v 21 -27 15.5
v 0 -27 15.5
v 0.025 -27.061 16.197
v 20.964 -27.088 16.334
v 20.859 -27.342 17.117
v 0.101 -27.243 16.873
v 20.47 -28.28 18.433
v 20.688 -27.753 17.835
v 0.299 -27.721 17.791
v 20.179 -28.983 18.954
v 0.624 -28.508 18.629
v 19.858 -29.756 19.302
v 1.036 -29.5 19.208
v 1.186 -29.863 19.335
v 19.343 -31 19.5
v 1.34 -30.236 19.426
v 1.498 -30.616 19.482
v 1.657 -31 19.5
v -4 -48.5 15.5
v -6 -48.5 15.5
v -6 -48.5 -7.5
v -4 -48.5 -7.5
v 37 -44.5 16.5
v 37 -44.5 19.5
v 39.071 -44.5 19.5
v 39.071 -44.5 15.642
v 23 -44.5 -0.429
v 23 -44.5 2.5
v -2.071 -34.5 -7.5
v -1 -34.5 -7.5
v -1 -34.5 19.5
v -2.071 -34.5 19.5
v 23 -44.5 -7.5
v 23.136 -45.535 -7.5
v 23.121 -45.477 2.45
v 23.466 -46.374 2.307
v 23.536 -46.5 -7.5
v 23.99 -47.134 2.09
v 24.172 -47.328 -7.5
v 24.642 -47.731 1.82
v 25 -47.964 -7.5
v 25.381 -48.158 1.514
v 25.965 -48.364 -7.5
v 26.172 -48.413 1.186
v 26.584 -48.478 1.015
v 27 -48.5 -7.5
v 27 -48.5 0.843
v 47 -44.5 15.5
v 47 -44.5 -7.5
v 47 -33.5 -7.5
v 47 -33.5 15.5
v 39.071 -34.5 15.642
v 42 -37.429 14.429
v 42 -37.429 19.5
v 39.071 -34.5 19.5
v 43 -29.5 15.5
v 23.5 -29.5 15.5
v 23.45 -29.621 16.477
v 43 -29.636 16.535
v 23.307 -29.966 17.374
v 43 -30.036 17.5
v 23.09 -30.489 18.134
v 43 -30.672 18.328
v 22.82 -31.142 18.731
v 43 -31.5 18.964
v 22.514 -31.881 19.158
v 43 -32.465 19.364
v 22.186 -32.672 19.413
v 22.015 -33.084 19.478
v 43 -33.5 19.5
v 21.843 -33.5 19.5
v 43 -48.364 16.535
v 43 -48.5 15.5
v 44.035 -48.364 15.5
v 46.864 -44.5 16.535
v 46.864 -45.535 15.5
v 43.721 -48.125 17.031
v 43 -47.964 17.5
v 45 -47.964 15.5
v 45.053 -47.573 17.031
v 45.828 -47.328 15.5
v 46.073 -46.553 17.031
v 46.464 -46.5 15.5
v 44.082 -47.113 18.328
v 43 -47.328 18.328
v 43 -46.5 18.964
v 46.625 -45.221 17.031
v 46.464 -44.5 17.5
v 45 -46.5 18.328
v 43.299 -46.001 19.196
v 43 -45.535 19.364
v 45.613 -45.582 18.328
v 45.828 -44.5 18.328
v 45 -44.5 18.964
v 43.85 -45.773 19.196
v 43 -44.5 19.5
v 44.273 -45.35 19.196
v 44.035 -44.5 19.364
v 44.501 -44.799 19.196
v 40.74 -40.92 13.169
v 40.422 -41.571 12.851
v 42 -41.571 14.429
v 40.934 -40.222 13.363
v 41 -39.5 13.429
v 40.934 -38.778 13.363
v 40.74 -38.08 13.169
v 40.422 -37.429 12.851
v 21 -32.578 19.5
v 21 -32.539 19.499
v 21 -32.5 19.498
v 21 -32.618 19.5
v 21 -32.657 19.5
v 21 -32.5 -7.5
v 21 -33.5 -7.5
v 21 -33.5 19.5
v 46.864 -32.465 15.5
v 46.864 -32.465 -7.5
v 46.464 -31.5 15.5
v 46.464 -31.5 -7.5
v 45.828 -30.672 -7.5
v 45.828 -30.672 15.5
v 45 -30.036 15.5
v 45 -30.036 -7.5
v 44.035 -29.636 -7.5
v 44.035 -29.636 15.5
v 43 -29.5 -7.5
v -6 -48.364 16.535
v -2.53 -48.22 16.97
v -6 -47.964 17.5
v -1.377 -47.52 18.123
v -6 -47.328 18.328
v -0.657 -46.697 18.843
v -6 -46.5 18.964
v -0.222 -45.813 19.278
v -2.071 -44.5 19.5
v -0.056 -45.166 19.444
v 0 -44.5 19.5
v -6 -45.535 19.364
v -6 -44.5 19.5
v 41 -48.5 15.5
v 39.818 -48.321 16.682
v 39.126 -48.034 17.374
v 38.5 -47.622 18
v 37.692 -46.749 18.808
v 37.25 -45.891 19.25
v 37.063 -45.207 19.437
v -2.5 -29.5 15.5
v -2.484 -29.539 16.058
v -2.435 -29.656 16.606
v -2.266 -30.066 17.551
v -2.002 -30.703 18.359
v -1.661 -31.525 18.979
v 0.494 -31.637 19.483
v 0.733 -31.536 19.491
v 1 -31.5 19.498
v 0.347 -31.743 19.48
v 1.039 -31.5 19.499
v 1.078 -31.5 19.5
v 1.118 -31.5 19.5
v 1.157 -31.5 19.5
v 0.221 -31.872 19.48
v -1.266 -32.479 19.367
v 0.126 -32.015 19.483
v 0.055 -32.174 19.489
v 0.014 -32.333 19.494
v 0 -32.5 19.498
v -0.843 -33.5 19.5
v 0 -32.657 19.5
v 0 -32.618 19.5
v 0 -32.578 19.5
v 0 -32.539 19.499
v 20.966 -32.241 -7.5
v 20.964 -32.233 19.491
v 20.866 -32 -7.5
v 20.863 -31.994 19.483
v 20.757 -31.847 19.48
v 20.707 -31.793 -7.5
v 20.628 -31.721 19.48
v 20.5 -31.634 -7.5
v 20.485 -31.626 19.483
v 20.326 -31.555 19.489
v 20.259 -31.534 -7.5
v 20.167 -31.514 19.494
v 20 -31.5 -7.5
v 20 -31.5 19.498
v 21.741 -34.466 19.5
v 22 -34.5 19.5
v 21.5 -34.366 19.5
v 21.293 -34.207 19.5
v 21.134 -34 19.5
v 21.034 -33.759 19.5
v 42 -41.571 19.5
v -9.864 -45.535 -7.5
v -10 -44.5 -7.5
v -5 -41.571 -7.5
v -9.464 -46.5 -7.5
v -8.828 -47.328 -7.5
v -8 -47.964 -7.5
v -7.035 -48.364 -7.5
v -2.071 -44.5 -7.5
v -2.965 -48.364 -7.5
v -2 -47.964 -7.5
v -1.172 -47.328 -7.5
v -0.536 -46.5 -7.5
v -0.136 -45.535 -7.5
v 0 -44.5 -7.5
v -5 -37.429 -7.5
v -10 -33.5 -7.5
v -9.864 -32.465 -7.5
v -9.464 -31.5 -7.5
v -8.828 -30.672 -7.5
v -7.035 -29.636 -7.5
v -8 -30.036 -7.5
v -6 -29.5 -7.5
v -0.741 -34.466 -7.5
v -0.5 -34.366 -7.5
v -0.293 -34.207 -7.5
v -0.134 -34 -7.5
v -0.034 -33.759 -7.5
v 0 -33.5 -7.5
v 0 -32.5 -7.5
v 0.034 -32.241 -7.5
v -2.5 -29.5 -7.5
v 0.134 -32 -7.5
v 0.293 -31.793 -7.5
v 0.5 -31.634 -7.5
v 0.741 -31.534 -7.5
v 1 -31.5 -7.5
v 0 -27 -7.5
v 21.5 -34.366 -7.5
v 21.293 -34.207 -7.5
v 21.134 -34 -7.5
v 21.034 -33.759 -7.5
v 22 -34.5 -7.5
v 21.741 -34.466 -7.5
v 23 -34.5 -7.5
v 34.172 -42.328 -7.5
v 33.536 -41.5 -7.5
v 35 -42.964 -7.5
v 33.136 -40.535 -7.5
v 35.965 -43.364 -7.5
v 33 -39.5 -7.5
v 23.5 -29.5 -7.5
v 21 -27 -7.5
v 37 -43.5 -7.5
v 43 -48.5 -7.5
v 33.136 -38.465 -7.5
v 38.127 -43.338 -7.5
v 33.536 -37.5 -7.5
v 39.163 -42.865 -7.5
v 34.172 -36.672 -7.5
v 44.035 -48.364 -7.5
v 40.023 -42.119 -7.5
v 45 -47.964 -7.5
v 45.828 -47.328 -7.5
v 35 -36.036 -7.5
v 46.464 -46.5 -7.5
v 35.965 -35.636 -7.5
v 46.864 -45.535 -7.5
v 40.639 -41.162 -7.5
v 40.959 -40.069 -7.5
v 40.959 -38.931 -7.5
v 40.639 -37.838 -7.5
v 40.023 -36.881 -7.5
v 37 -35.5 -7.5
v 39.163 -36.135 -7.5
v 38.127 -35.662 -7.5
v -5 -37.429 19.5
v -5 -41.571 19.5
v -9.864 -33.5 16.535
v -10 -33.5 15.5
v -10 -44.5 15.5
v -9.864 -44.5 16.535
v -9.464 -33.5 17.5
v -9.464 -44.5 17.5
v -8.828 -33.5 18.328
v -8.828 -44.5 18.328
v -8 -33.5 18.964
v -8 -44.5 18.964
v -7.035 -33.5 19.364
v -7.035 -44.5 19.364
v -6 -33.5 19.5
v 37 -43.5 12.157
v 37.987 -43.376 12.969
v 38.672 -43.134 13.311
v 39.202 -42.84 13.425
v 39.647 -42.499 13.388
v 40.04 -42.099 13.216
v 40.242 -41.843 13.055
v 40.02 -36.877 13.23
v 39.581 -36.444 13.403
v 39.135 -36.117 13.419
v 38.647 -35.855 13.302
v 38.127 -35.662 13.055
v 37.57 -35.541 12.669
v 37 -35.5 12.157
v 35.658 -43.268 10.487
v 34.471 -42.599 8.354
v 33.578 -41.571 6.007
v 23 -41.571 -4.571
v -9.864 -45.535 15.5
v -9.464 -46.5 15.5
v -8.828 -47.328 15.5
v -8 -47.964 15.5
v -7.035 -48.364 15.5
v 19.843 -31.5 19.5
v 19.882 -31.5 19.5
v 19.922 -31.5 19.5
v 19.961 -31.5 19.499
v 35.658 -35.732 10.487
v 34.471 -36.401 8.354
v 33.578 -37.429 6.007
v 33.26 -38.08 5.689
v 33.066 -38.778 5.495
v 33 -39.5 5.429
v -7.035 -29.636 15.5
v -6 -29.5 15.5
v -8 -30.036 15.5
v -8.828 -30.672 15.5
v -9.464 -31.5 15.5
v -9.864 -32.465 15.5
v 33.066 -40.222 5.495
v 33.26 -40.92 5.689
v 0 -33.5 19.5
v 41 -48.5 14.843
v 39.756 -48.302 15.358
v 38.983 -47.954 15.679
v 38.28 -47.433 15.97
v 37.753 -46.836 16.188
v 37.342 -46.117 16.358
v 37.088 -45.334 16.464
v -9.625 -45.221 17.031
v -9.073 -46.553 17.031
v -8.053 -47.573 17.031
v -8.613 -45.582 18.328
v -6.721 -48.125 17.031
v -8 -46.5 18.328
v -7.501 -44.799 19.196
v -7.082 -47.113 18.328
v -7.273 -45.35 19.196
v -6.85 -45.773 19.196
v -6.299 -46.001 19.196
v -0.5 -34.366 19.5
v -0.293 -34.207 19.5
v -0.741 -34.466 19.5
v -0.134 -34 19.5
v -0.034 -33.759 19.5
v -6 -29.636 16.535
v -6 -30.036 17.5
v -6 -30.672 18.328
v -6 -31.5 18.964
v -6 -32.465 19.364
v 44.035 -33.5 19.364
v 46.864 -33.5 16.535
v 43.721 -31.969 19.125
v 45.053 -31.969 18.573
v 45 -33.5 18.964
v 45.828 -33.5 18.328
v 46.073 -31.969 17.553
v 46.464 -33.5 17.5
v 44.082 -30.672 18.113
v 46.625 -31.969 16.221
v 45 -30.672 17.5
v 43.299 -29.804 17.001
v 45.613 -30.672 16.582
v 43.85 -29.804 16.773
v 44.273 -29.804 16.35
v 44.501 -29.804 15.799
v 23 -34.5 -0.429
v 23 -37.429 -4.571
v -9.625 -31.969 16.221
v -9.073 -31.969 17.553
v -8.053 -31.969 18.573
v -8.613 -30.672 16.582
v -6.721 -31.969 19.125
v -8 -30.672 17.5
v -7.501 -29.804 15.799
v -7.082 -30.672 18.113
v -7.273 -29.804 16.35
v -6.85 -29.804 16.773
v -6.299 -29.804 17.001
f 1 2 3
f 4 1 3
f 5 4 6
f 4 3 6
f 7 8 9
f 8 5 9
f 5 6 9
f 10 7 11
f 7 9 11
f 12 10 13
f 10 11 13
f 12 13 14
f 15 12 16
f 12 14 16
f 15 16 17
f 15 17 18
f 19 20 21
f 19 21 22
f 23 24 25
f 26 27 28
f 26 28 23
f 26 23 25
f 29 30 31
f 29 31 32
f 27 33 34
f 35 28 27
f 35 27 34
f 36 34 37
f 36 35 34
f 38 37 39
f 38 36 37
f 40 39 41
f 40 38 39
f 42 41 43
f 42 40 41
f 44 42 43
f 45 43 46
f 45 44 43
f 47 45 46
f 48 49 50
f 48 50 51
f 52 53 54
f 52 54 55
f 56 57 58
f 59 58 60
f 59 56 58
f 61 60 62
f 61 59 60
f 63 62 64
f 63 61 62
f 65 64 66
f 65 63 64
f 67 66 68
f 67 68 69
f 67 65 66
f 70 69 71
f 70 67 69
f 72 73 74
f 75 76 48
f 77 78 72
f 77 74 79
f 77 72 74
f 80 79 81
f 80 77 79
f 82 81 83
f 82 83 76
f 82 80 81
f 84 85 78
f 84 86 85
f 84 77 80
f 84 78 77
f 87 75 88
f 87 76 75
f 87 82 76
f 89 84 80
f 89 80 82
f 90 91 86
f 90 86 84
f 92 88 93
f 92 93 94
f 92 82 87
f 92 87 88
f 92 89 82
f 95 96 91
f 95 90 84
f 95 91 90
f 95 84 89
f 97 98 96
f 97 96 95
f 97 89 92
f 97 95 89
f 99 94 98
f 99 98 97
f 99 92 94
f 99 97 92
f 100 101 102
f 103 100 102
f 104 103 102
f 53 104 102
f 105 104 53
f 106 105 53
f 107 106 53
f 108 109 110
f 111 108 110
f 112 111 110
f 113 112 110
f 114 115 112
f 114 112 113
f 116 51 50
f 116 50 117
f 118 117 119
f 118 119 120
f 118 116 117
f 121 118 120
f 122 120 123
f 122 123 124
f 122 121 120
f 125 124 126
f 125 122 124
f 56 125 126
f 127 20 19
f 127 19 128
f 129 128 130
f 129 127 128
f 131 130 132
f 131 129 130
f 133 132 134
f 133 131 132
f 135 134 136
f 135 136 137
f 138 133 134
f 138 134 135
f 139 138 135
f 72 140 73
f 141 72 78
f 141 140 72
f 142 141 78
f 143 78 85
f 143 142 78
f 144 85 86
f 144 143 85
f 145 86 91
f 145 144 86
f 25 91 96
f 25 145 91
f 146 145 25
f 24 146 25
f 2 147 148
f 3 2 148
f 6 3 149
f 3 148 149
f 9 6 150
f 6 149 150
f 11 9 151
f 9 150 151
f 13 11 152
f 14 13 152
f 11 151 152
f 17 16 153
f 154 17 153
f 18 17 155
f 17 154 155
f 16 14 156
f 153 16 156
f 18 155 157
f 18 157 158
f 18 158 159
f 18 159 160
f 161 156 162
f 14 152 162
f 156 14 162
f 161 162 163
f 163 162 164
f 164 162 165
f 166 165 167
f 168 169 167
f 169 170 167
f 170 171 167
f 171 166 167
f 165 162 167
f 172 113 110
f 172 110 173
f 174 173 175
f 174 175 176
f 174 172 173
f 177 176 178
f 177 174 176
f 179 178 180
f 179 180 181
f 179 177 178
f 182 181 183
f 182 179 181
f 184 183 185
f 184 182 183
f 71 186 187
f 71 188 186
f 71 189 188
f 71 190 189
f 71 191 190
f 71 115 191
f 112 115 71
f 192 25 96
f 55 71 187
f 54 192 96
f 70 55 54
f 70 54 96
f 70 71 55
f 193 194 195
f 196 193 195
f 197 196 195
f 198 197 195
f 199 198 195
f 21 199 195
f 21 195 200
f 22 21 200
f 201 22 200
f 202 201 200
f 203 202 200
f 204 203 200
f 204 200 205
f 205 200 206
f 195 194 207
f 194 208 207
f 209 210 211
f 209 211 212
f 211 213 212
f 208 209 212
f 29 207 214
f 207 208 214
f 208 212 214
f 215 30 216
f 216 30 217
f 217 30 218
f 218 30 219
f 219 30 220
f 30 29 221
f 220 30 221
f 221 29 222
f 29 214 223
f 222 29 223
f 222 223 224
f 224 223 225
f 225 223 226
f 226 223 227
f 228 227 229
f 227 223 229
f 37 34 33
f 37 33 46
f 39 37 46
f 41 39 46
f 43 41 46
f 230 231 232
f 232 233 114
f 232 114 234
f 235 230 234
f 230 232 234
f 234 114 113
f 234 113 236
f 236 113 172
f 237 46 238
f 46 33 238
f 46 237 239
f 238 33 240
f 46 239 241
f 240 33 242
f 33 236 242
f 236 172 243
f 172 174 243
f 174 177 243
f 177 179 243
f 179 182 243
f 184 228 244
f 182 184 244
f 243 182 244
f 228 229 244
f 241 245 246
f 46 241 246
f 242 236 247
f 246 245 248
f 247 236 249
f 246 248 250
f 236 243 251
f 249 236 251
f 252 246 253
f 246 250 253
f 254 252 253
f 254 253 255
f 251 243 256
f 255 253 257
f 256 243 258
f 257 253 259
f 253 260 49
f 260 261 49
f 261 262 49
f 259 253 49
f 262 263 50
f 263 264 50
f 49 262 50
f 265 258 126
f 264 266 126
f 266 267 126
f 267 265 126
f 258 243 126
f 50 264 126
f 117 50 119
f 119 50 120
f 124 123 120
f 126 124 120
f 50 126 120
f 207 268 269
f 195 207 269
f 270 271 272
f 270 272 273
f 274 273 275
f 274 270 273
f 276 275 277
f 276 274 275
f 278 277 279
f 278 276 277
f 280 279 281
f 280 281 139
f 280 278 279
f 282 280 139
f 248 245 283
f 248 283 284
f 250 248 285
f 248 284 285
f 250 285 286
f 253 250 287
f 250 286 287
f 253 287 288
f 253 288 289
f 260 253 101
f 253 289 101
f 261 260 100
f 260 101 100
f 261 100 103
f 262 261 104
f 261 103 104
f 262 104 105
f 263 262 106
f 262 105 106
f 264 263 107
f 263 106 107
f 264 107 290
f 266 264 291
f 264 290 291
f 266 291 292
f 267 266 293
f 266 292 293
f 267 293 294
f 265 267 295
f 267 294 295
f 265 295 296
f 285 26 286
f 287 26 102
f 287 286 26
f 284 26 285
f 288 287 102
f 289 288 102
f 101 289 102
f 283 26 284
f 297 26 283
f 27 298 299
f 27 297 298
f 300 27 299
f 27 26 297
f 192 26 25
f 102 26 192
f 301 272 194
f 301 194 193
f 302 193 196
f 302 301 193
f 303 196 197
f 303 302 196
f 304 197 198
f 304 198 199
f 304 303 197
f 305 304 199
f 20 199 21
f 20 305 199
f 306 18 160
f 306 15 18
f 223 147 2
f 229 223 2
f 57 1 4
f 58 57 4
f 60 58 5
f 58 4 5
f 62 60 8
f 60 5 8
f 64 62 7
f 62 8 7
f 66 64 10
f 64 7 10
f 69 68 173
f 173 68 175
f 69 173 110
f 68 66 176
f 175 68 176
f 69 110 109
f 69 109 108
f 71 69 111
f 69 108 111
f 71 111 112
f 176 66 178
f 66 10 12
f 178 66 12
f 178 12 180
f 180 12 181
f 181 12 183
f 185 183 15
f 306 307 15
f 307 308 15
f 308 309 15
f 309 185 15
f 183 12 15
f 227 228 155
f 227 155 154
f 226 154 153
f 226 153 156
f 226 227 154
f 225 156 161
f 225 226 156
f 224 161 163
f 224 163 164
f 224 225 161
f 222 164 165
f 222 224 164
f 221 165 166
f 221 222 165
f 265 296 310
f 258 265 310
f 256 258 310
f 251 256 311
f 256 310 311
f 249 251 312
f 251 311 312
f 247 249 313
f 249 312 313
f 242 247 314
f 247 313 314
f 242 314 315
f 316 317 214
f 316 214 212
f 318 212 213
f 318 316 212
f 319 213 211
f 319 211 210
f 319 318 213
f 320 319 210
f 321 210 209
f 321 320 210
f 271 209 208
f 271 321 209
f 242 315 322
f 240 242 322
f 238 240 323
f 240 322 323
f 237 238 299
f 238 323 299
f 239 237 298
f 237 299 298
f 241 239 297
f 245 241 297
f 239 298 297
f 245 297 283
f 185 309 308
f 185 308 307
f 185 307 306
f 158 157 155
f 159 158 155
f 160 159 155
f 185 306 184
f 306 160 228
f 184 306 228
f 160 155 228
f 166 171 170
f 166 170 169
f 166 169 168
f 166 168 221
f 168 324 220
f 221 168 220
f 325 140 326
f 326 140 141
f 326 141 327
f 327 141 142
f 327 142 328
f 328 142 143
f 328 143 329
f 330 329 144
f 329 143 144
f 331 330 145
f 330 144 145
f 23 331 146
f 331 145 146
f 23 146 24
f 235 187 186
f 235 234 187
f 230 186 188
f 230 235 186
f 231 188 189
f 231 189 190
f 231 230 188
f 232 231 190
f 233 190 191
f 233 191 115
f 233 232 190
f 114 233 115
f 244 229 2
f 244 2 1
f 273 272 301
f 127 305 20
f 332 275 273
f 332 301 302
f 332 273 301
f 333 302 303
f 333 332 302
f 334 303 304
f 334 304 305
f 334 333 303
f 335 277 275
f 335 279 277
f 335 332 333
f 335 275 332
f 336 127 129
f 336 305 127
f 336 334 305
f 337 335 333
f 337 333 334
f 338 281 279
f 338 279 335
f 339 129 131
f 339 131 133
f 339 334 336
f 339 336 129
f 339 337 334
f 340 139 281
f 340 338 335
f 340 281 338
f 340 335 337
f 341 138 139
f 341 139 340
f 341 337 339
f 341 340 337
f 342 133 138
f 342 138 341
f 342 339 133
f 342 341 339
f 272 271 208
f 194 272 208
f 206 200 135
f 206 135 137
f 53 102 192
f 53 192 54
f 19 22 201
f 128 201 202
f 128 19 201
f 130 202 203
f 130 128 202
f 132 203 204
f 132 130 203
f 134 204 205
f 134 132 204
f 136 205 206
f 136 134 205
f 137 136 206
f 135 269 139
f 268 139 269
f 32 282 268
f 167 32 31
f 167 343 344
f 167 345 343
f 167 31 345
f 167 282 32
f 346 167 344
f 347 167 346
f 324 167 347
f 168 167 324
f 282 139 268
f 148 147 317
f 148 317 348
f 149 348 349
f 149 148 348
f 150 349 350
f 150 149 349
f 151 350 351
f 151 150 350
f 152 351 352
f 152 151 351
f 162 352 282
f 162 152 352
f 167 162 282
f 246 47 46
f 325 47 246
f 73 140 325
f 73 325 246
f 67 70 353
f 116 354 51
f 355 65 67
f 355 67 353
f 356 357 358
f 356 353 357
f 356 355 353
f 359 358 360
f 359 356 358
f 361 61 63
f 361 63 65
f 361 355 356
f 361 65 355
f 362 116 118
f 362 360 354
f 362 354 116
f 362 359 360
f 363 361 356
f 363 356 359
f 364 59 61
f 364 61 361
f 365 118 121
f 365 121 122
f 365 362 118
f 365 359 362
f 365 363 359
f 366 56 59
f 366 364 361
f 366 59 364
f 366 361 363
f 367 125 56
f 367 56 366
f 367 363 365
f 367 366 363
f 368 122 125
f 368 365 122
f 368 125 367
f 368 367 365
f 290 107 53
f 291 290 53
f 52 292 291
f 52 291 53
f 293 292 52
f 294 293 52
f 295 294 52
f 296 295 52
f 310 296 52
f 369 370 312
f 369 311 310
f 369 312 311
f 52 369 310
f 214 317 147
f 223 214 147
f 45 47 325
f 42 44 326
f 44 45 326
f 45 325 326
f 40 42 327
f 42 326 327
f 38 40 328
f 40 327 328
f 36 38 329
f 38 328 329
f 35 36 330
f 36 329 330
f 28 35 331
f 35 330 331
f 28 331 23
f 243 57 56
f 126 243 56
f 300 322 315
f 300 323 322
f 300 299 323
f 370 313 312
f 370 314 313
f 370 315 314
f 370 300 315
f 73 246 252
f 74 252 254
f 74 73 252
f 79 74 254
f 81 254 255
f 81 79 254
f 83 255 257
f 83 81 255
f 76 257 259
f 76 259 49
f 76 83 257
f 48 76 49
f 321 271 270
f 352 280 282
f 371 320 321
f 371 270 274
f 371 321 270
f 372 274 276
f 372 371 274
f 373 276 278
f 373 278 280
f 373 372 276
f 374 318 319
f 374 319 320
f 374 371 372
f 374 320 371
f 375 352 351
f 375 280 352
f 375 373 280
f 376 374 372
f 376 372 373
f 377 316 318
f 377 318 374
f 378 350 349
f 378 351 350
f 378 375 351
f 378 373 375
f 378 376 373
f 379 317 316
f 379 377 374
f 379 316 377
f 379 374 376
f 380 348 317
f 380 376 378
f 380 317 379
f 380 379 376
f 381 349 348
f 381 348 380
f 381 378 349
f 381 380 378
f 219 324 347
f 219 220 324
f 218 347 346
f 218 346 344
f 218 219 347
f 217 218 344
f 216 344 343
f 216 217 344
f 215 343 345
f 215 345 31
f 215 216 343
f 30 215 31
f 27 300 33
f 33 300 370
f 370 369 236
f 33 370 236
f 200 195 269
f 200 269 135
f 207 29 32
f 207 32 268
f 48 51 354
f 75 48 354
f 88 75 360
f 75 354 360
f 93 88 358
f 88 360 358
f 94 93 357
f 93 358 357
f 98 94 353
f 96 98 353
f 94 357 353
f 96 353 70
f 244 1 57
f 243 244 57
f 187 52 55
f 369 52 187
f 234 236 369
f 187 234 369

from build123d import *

# Parameters (mm, degrees)
F0_W           = 10
F0_H           = 17
F0_H_2         = 10
F0_W_2         = 23
F1_DEPTH       = 5
F2_DEPTH       = 14
F4_DEPTH       = 35
F8_DEPTH       = 27.001
F8_DEPTH_BACK  = 35
F10_W          = 27
F10_H          = 3
F11_DEPTH      = 21
F13_DEPTH      = 27
F14_R          = 1
F15_T1_DEPTH   = 11
F15_T3_DEPTH   = 6
F15_T5_DEPTH   = 23
F15_T7_DEPTH   = 6
F15_T9_DEPTH   = 27
F15_S13_W      = 4.08
F15_S13_H      = 4.08
F15_T14_DEPTH  = 4.08
F15_S19_W      = 4.08
F15_S19_H      = 4.08
F15_T20_DEPTH  = 4.08
F15_S25_W      = 4.08
F15_S25_H      = 4.08
F15_T26_DEPTH  = 4.08
F15_S31_W      = 4.08
F15_S31_H      = 4.08
F15_T32_DEPTH  = 4.08
F15_T38_DEPTH  = 13
F15_T43_DEPTH  = 39.7989898732
F15_T49_DEPTH  = 20
F15_T54_DEPTH  = 29.5
F15_T59_DEPTH  = 23.5355339059
F15_T65_DEPTH  = 41
F15_T71_DEPTH  = 23.5355339059
F15_T77_DEPTH  = 13.5
F15_T83_DEPTH  = 16
F15_T87_DEPTH  = 23
F15_T95_DEPTH  = 16
F15_T99_DEPTH  = 37
F15_T106_DEPTH = 13
F15_T110_DEPTH = 39.7989898732
F15_T117_DEPTH = 20
F15_T121_DEPTH = 39.7989898732
F15_T128_DEPTH = 29.5
F15_T132_DEPTH = 23.5355339059
F15_T139_DEPTH = 23.5355339059
F15_T143_DEPTH = 41
F15_T150_DEPTH = 41
F15_T154_DEPTH = 23.5355339059
F15_T161_DEPTH = 23.5355339059
F15_T165_DEPTH = 13.5
F16_ANGLE      = 270


# Not quite as in the source:
# - a fillet or chamfer that OpenCascade refuses, or shapes differently, is made with other operations: its cross-section is extruded or revolved along the edge and cut away or added


with BuildPart() as f1:
    # F0 (on Top) → F1 (new body)
    with BuildSketch(Plane.XY):
        Polygon((37, 0), (0, 0), (0, -17), (23, -17), (37, -3), align=None)
        with Locations((-5, -8.5)):
            Rectangle(F0_W, F0_H)
        Polygon((37, -17), (23, -17), (23, -27), (47, -27), (47, -17), align=None)
        with Locations((-5, -22)):
            Rectangle(F0_W, F0_H_2)
        Polygon((47, 0), (37, 0), (37, -3), (37, -17), (47, -17), align=None)
        with Locations((11.5, -22)):
            Rectangle(F0_W_2, F0_H_2)
        Polygon((37, -17), (37, -3), (23, -17), align=None)
    extrude(amount=-F1_DEPTH)

    # F0 (on Top) → F2 (join)
    with BuildSketch(Plane.XY):
        with Locations((-5, -8.5)):
            Rectangle(F0_W, F0_H)
        Polygon((47, 0), (37, 0), (37, -3), (37, -17), (47, -17), align=None)
        Polygon((37, -17), (37, -3), (23, -17), align=None)
        Polygon((37, -17), (23, -17), (23, -27), (47, -27), (47, -17), align=None)
        with Locations((-5, -22)):
            Rectangle(F0_W, F0_H_2)
    extrude(amount=F2_DEPTH)

    # F3 (on face) → F4 (cut)
    with BuildSketch(Plane(origin=(0, 0, 0), x_dir=(-1, 0, 0), z_dir=(0, 1, 0))):
        Polygon((2.0710678119, 0), (5, 2.9289321881), (5, 7.0710678119), (2.0710678119, 10), (0, 10), (0, 0), align=None)
    extrude(amount=-F4_DEPTH, mode=Mode.SUBTRACT)

    # F7: sweep along a path in F6
    with BuildLine(Plane.XY.offset(4.5)) as f7_path:
        Line((37, 0), (37, -3))
        Line((37, -3), (23, -17))
        Line((23, -17), (19.396028844, -20.603971156))
    # F3 (on face) → F7 (sweep, cut)
    with BuildSketch(Plane(origin=(0, 0, 0), x_dir=(-1, 0, 0), z_dir=(0, 1, 0))):
        with BuildLine():
            Line((-39.0710678119, 0), (-37, 0))
            Line((-37, 0), (-37, 1))
            ThreePointArc((-37, 1), (-41, 5), (-37, 9))
            Line((-37, 9), (-37, 10))
            Line((-37, 10), (-39.0710678119, 10))
            Line((-39.0710678119, 10), (-42, 7.0710678119))
            Line((-42, 7.0710678119), (-42, 2.9289321881))
            Line((-42, 2.9289321881), (-39.0710678119, 0))
        make_face()
        with BuildLine():
            ThreePointArc((-37, 9), (-41, 5), (-37, 1))
            Line((-37, 1), (-37, 9))
        make_face()
    sweep(path=f7_path.line, transition=Transition.RIGHT, mode=Mode.SUBTRACT)

    # F3 (on face) → F8 (cut, two sides)
    with BuildSketch(Plane(origin=(0, 0, 0), x_dir=(-1, 0, 0), z_dir=(0, 1, 0))) as f8_sk:
        with BuildLine():
            Line((-37, 9), (-37, 1))
            ThreePointArc((-37, 1), (-34.1715728753, 2.1715728753), (-33, 5))
            ThreePointArc((-33, 5), (-34.1715728753, 7.8284271247), (-37, 9))
        make_face()
        with BuildLine():
            ThreePointArc((-37, 9), (-41, 5), (-37, 1))
            Line((-37, 1), (-37, 9))
        make_face()
    extrude(amount=-F8_DEPTH, mode=Mode.SUBTRACT)
    extrude(f8_sk.sketch, amount=F8_DEPTH_BACK, mode=Mode.SUBTRACT)

    # F10 (on offset) → F11 (cut)
    with BuildSketch(Plane(origin=(0, 0, 0), x_dir=(0, -1, 0), z_dir=(-1, 0, 0))):
        with Locations((13.5, -1.5)):
            Rectangle(F10_W, F10_H)
    extrude(amount=-F11_DEPTH, mode=Mode.SUBTRACT)

    # F12 (on face) → F13 (join, through all)
    with BuildSketch(Plane.XZ.offset(27)):
        Polygon((21, -7.5), (23.5, -5), (-2.5, -5), (0, -7.5), align=None)
    extrude(amount=-F13_DEPTH)

    # F14
    f14_edges = [f1.edges().sort_by_distance(p)[0] for p in [
        (0, -13.5, 0),
        (21, -13.5, 0),
        (21, -13.5, -3),
        (0, -13.5, -3),
    ]]
    fillet(f14_edges, radius=F14_R)

    # F15: fillet of radius 4 on 17 edges, made by hand

    # F15_s2 → F15_t1 (cut)
    with BuildSketch(Plane.XY.offset(-1)):
        with BuildLine():
            ThreePointArc((-10, -4), (-8.8284271247, -1.1715728753), (-6, 0))
            Line((-6, 0), (-6, 0.08))
            Line((-6, 0.08), (-10.08, 0.08))
            Line((-10.08, 0.08), (-10.08, -4))
            Line((-10.08, -4), (-10, -4))
        make_face()
        with BuildLine():
            ThreePointArc((47, -4), (45.8284271247, -1.1715728753), (43, 0))
            Line((43, 0), (43, 0.08))
            Line((43, 0.08), (47.08, 0.08))
            Line((47.08, 0.08), (47.08, -4))
            Line((47.08, -4), (47, -4))
        make_face()
    extrude(amount=F15_T1_DEPTH, mode=Mode.SUBTRACT)

    # F15_s4 → F15_t3 (cut)
    with BuildSketch(Plane.YZ.offset(37)):
        with BuildLine():
            ThreePointArc((-4, 14), (-1.1715728753, 12.8284271247), (0, 10))
            Line((0, 10), (0.08, 10))
            Line((0.08, 10), (0.08, 14.08))
            Line((0.08, 14.08), (-4, 14.08))
            Line((-4, 14.08), (-4, 14))
        make_face()
    extrude(amount=F15_T3_DEPTH, mode=Mode.SUBTRACT)

    # F15_s6 → F15_t5 (cut)
    with BuildSketch(Plane.XZ.offset(4)):
        with BuildLine():
            ThreePointArc((43, 14), (45.8284271247, 12.8284271247), (47, 10))
            Line((47, 10), (47.08, 10))
            Line((47.08, 10), (47.08, 14.08))
            Line((47.08, 14.08), (43, 14.08))
            Line((43, 14.08), (43, 14))
        make_face()
        with BuildLine():
            ThreePointArc((47, -1), (45.8284271247, -3.8284271247), (43, -5))
            Line((43, -5), (43, -5.08))
            Line((43, -5.08), (47.08, -5.08))
            Line((47.08, -5.08), (47.08, -1))
            Line((47.08, -1), (47, -1))
        make_face()
        with BuildLine():
            ThreePointArc((-10, 10), (-8.8284271247, 12.8284271247), (-6, 14))
            Line((-6, 14), (-6, 14.08))
            Line((-6, 14.08), (-10.08, 14.08))
            Line((-10.08, 14.08), (-10.08, 10))
            Line((-10.08, 10), (-10, 10))
        make_face()
        with BuildLine():
            ThreePointArc((-6, -5), (-8.8284271247, -3.8284271247), (-10, -1))
            Line((-10, -1), (-10.08, -1))
            Line((-10.08, -1), (-10.08, -5.08))
            Line((-10.08, -5.08), (-6, -5.08))
            Line((-6, -5.08), (-6, -5))
        make_face()
    extrude(amount=F15_T5_DEPTH, mode=Mode.SUBTRACT)

    # F15_s8 → F15_t7 (cut)
    with BuildSketch(Plane.YZ.offset(-6)):
        with BuildLine():
            ThreePointArc((-4, 14), (-1.1715728753, 12.8284271247), (0, 10))
            Line((0, 10), (0.08, 10))
            Line((0.08, 10), (0.08, 14.08))
            Line((0.08, 14.08), (-4, 14.08))
            Line((-4, 14.08), (-4, 14))
        make_face()
    extrude(amount=F15_T7_DEPTH, mode=Mode.SUBTRACT)

    # F15_s10 → F15_t9 (cut)
    with BuildSketch(Plane.XZ):
        with BuildLine():
            ThreePointArc((-4, 14), (-1.1715728753, 12.8284271247), (0, 10))
            Line((0, 10), (0.08, 10))
            Line((0.08, 10), (0.08, 14.08))
            Line((0.08, 14.08), (-4, 14.08))
            Line((-4, 14.08), (-4, 14))
        make_face()
    extrude(amount=F15_T9_DEPTH, mode=Mode.SUBTRACT)


with BuildPart() as f15_tool12:
    # F15_s13 → F15_t14 (new body)
    with BuildSketch(Plane.XZ.offset(4)):
        with Locations((-8.04, 12.04)):
            Rectangle(F15_S13_W, F15_S13_H)
    extrude(amount=-F15_T14_DEPTH)

    # F15_s15 → F15_t16 (revolve, cut)
    with BuildSketch(Plane(origin=(-6, -4, 10), x_dir=(0.7071067812, 0, -0.7071067812), z_dir=(0.7071067812, 0, 0.7071067812))):
        with BuildLine():
            ThreePointArc((0, -4), (4, 0), (0, 4))
            Line((0, 4), (0, -4))
        make_face()
    revolve(axis=Axis((-6, -4, 10), (0, 1, 0)), mode=Mode.SUBTRACT)


with BuildPart() as f1_1:
    add(f1.part)

    # F15_t11: cut F15_tool12
    add(f15_tool12.part, mode=Mode.SUBTRACT)


with BuildPart() as f15_tool18:
    # F15_s19 → F15_t20 (new body)
    with BuildSketch(Plane.XY.offset(-1)):
        with Locations((-8.04, -1.96)):
            Rectangle(F15_S19_W, F15_S19_H)
    extrude(amount=-F15_T20_DEPTH)

    # F15_s21 → F15_t22 (revolve, cut)
    with BuildSketch(Plane(origin=(-6, -4, -1), x_dir=(0.7071067812, -0.7071067812, 0), z_dir=(0.7071067812, 0.7071067812, 0))):
        with BuildLine():
            ThreePointArc((0, -4), (4, 0), (0, 4))
            Line((0, 4), (0, -4))
        make_face()
    revolve(axis=Axis((-6, -4, -1), (0, 0, -1)), mode=Mode.SUBTRACT)


with BuildPart() as f1_2:
    add(f1_1.part)

    # F15_t17: cut F15_tool18
    add(f15_tool18.part, mode=Mode.SUBTRACT)


with BuildPart() as f15_tool24:
    # F15_s25 → F15_t26 (new body)
    with BuildSketch(Plane.XY.offset(-1)):
        with Locations((45.04, -1.96)):
            Rectangle(F15_S25_W, F15_S25_H)
    extrude(amount=-F15_T26_DEPTH)

    # F15_s27 → F15_t28 (revolve, cut)
    with BuildSketch(Plane(origin=(43, -4, -1), x_dir=(-0.7071067812, -0.7071067812, 0), z_dir=(0.7071067812, -0.7071067812, 0))):
        with BuildLine():
            ThreePointArc((0, -4), (4, 0), (0, 4))
            Line((0, 4), (0, -4))
        make_face()
    revolve(axis=Axis((43, -4, -1), (0, 0, -1)), mode=Mode.SUBTRACT)


with BuildPart() as f1_3:
    add(f1_2.part)

    # F15_t23: cut F15_tool24
    add(f15_tool24.part, mode=Mode.SUBTRACT)


with BuildPart() as f15_tool30:
    # F15_s31 → F15_t32 (new body)
    with BuildSketch(Plane.XZ.offset(4)):
        with Locations((45.04, 12.04)):
            Rectangle(F15_S31_W, F15_S31_H)
    extrude(amount=-F15_T32_DEPTH)

    # F15_s33 → F15_t34 (revolve, cut)
    with BuildSketch(Plane(origin=(43, -4, 10), x_dir=(-0.7071067812, 0, -0.7071067812), z_dir=(0.7071067812, 0, -0.7071067812))):
        with BuildLine():
            ThreePointArc((0, -4), (4, 0), (0, 4))
            Line((0, 4), (0, -4))
        make_face()
    revolve(axis=Axis((43, -4, 10), (0, 1, 0)), mode=Mode.SUBTRACT)


with BuildPart() as f1_4:
    add(f1_3.part)

    # F15_t29: cut F15_tool30
    add(f15_tool30.part, mode=Mode.SUBTRACT)


with BuildPart() as f15_tool36:
    # F15_s37 → F15_t38 (new body)
    with BuildSketch(Plane.XZ):
        with BuildLine():
            ThreePointArc((41, 14), (38.1715728753, 12.8284271247), (37, 10))
            Line((37, 10), (36.92, 10))
            Line((36.92, 10), (36.92, 14.08))
            Line((36.92, 14.08), (41, 14.08))
            Line((41, 14.08), (41, 14))
        make_face()
    extrude(amount=F15_T38_DEPTH)

    split(bisect_by=Plane(origin=(20, -20, 0), x_dir=(0, 0, 1), z_dir=(-0.7071067812, 0.7071067812, 0)), keep=Keep.TOP)


with BuildPart() as f1_5:
    add(f1_4.part)

    # F15_t35: cut F15_tool36
    add(f15_tool36.part, mode=Mode.SUBTRACT)


with BuildPart() as f15_tool41:
    # F15_s42 → F15_t43 (new body)
    with BuildSketch(Plane(origin=(24.0710678119, 24.0710678119, 0), x_dir=(0, 0, 1), z_dir=(-0.7071067812, -0.7071067812, 0))):
        with BuildLine():
            ThreePointArc((14, -32.2842712475), (12.8284271247, -29.4558441227), (10, -28.2842712475))
            Line((10, -28.2842712475), (10, -28.2042712475))
            Line((10, -28.2042712475), (14.08, -28.2042712475))
            Line((14.08, -28.2042712475), (14.08, -32.2842712475))
            Line((14.08, -32.2842712475), (14, -32.2842712475))
        make_face()
    extrude(amount=F15_T43_DEPTH)

    split(bisect_by=Plane.YZ.offset(23), keep=Keep.TOP)

    split(bisect_by=Plane.YZ.offset(37), keep=Keep.BOTTOM)


with BuildPart() as f1_6:
    add(f1_5.part)

    # F15_t40: cut F15_tool41
    add(f15_tool41.part, mode=Mode.SUBTRACT)


with BuildPart() as f15_tool47:
    # F15_s48 → F15_t49 (new body)
    with BuildSketch(Plane.XZ.offset(7)):
        with BuildLine():
            ThreePointArc((23, 10), (24.1715728753, 12.8284271247), (27, 14))
            Line((27, 14), (27, 14.08))
            Line((27, 14.08), (22.92, 14.08))
            Line((22.92, 14.08), (22.92, 10))
            Line((22.92, 10), (23, 10))
        make_face()
    extrude(amount=F15_T49_DEPTH)

    split(bisect_by=Plane(origin=(20, -20, 0), x_dir=(0, 0, 1), z_dir=(0.7071067812, -0.7071067812, 0)), keep=Keep.TOP)


with BuildPart() as f1_7:
    add(f1_6.part)

    # F15_t46: cut F15_tool47
    add(f15_tool47.part, mode=Mode.SUBTRACT)


with BuildPart() as f15_tool52:
    # F15_s53 → F15_t54 (new body)
    with BuildSketch(Plane.YZ.offset(43)):
        with BuildLine():
            ThreePointArc((-4, -5), (-1.1715728753, -3.8284271247), (0, -1))
            Line((0, -1), (0.08, -1))
            Line((0.08, -1), (0.08, -5.08))
            Line((0.08, -5.08), (-4, -5.08))
            Line((-4, -5.08), (-4, -5))
        make_face()
    extrude(amount=-F15_T54_DEPTH)

    split(bisect_by=Plane(origin=(14.25, 0, -14.25), x_dir=(0, 1, 0), z_dir=(0.7071067812, 0, -0.7071067812)), keep=Keep.TOP)


with BuildPart() as f1_8:
    add(f1_7.part)

    # F15_t51: cut F15_tool52
    add(f15_tool52.part, mode=Mode.SUBTRACT)


with BuildPart() as f15_tool57:
    # F15_s58 → F15_t59 (new body)
    with BuildSketch(Plane(origin=(-0.3210678119, 0, -0.3210678119), x_dir=(0, 1, 0), z_dir=(0.7071067812, 0, 0.7071067812))):
        with BuildLine():
            ThreePointArc((-4, -20.1525432638), (-1.1715728753, -18.9809703886), (0, -16.1525432638))
            Line((0, -16.1525432638), (0.08, -16.1525432638))
            Line((0.08, -16.1525432638), (0.08, -20.2325432638))
            Line((0.08, -20.2325432638), (-4, -20.2325432638))
            Line((-4, -20.2325432638), (-4, -20.1525432638))
        make_face()
    extrude(amount=F15_T59_DEPTH)

    split(bisect_by=Plane.XY.offset(-5), keep=Keep.BOTTOM)

    split(bisect_by=Plane.XY.offset(-7.5), keep=Keep.TOP)


with BuildPart() as f1_9:
    add(f1_8.part)

    # F15_t56: cut F15_tool57
    add(f15_tool57.part, mode=Mode.SUBTRACT)


with BuildPart() as f15_tool63:
    # F15_s64 → F15_t65 (new body)
    with BuildSketch(Plane.YZ.offset(-10)):
        with BuildLine():
            ThreePointArc((-4, -7.5), (-1.1715728753, -6.3284271247), (0, -3.5))
            Line((0, -3.5), (0.08, -3.5))
            Line((0.08, -3.5), (0.08, -7.58))
            Line((0.08, -7.58), (-4, -7.58))
            Line((-4, -7.58), (-4, -7.5))
        make_face()
    extrude(amount=F15_T65_DEPTH)

    split(bisect_by=Plane(origin=(14.25, 0, -14.25), x_dir=(0, 1, 0), z_dir=(-0.7071067812, 0, 0.7071067812)), keep=Keep.TOP)

    split(bisect_by=Plane(origin=(-3.75, 0, -3.75), x_dir=(0, 1, 0), z_dir=(0.7071067812, 0, 0.7071067812)), keep=Keep.TOP)


with BuildPart() as f1_10:
    add(f1_9.part)

    # F15_t62: cut F15_tool63
    add(f15_tool63.part, mode=Mode.SUBTRACT)


with BuildPart() as f15_tool69:
    # F15_s70 → F15_t71 (new body)
    with BuildSketch(Plane(origin=(-5.8210678119, 0, 5.8210678119), x_dir=(0, 1, 0), z_dir=(0.7071067812, 0, -0.7071067812))):
        with BuildLine():
            ThreePointArc((-4, -5.3033008589), (-1.1715728753, -4.1317279836), (0, -1.3033008589))
            Line((0, -1.3033008589), (0.08, -1.3033008589))
            Line((0.08, -1.3033008589), (0.08, -5.3833008589))
            Line((0.08, -5.3833008589), (-4, -5.3833008589))
            Line((-4, -5.3833008589), (-4, -5.3033008589))
        make_face()
    extrude(amount=F15_T71_DEPTH)

    split(bisect_by=Plane.XY.offset(-7.5), keep=Keep.TOP)

    split(bisect_by=Plane.XY.offset(-5), keep=Keep.BOTTOM)


with BuildPart() as f1_11:
    add(f1_10.part)

    # F15_t68: cut F15_tool69
    add(f15_tool69.part, mode=Mode.SUBTRACT)


with BuildPart() as f15_tool75:
    # F15_s76 → F15_t77 (new body)
    with BuildSketch(Plane.YZ.offset(7.5)):
        with BuildLine():
            ThreePointArc((-4, -5), (-1.1715728753, -3.8284271247), (0, -1))
            Line((0, -1), (0.08, -1))
            Line((0.08, -1), (0.08, -5.08))
            Line((0.08, -5.08), (-4, -5.08))
            Line((-4, -5.08), (-4, -5))
        make_face()
    extrude(amount=-F15_T77_DEPTH)

    split(bisect_by=Plane(origin=(-3.75, 0, -3.75), x_dir=(0, 1, 0), z_dir=(-0.7071067812, 0, -0.7071067812)), keep=Keep.TOP)


with BuildPart() as f1_12:
    add(f1_11.part)

    # F15_t74: cut F15_tool75
    add(f15_tool75.part, mode=Mode.SUBTRACT)


with BuildPart() as f15_tool81:
    # F15_s82 → F15_t83 (new body)
    with BuildSketch(Plane.YZ.offset(43)):
        with BuildLine():
            ThreePointArc((-4, 14), (-1.1715728753, 12.8284271247), (0, 10))
            Line((0, 10), (0.08, 10))
            Line((0.08, 10), (0.08, 14.08))
            Line((0.08, 14.08), (-4, 14.08))
            Line((-4, 14.08), (-4, 14))
        make_face()
    extrude(amount=-F15_T83_DEPTH)

    split(bisect_by=Plane.YZ.offset(37), keep=Keep.BOTTOM)


with BuildPart() as f15_tool85:
    # F15_s86 → F15_t87 (new body)
    with BuildSketch(Plane.XZ.offset(-10)):
        with BuildLine():
            ThreePointArc((41, 14), (38.1715728753, 12.8284271247), (37, 10))
            Line((37, 10), (36.92, 10))
            Line((36.92, 10), (36.92, 14.08))
            Line((36.92, 14.08), (41, 14.08))
            Line((41, 14.08), (41, 14))
        make_face()
    extrude(amount=F15_T87_DEPTH)

    split(bisect_by=Plane.XZ, keep=Keep.BOTTOM)

    split(bisect_by=Plane(origin=(20, -20, 0), x_dir=(0, 0, 1), z_dir=(-0.7071067812, 0.7071067812, 0)), keep=Keep.TOP)


with BuildPart() as f15_tool81_1:
    add(f15_tool81.part)

    # F15_t90: intersect F15_tool85
    add(f15_tool85.part, mode=Mode.INTERSECT)


with BuildPart() as f1_13:
    add(f1_12.part)

    # F15_t79: cut F15_tool81
    add(f15_tool81_1.part, mode=Mode.SUBTRACT)


with BuildPart() as f15_tool93:
    # F15_s94 → F15_t95 (new body)
    with BuildSketch(Plane.YZ.offset(10)):
        with BuildLine():
            ThreePointArc((-4, 14), (-1.1715728753, 12.8284271247), (0, 10))
            Line((0, 10), (0.08, 10))
            Line((0.08, 10), (0.08, 14.08))
            Line((0.08, 14.08), (-4, 14.08))
            Line((-4, 14.08), (-4, 14))
        make_face()
    extrude(amount=-F15_T95_DEPTH)

    split(bisect_by=Plane.YZ, keep=Keep.TOP)


with BuildPart() as f15_tool97:
    # F15_s98 → F15_t99 (new body)
    with BuildSketch(Plane.XZ.offset(27)):
        with BuildLine():
            ThreePointArc((-4, 14), (-1.1715728753, 12.8284271247), (0, 10))
            Line((0, 10), (0.08, 10))
            Line((0.08, 10), (0.08, 14.08))
            Line((0.08, 14.08), (-4, 14.08))
            Line((-4, 14.08), (-4, 14))
        make_face()
    extrude(amount=-F15_T99_DEPTH)

    split(bisect_by=Plane.XZ, keep=Keep.BOTTOM)


with BuildPart() as f15_tool93_1:
    add(f15_tool93.part)

    # F15_t101: intersect F15_tool97
    add(f15_tool97.part, mode=Mode.INTERSECT)


with BuildPart() as f1_14:
    add(f1_13.part)

    # F15_t91: cut F15_tool93
    add(f15_tool93_1.part, mode=Mode.SUBTRACT)


with BuildPart() as f15_tool104:
    # F15_s105 → F15_t106 (new body)
    with BuildSketch(Plane.XZ):
        with BuildLine():
            ThreePointArc((41, 14), (38.1715728753, 12.8284271247), (37, 10))
            Line((37, 10), (36.92, 10))
            Line((36.92, 10), (36.92, 14.08))
            Line((36.92, 14.08), (41, 14.08))
            Line((41, 14.08), (41, 14))
        make_face()
    extrude(amount=F15_T106_DEPTH)

    split(bisect_by=Plane(origin=(20, -20, 0), x_dir=(0, 0, 1), z_dir=(0.7071067812, -0.7071067812, 0)), keep=Keep.TOP)


with BuildPart() as f15_tool108:
    # F15_s109 → F15_t110 (new body)
    with BuildSketch(Plane(origin=(24.0710678119, 24.0710678119, 0), x_dir=(0, 0, 1), z_dir=(-0.7071067812, -0.7071067812, 0))):
        with BuildLine():
            ThreePointArc((14, -32.2842712475), (12.8284271247, -29.4558441227), (10, -28.2842712475))
            Line((10, -28.2842712475), (10, -28.2042712475))
            Line((10, -28.2042712475), (14.08, -28.2042712475))
            Line((14.08, -28.2042712475), (14.08, -32.2842712475))
            Line((14.08, -32.2842712475), (14, -32.2842712475))
        make_face()
    extrude(amount=F15_T110_DEPTH)

    split(bisect_by=Plane.YZ.offset(37), keep=Keep.TOP)


with BuildPart() as f15_tool104_1:
    add(f15_tool104.part)

    # F15_t112: intersect F15_tool108
    add(f15_tool108.part, mode=Mode.INTERSECT)


with BuildPart() as f1_15:
    add(f1_14.part)

    # F15_t102: cut F15_tool104
    add(f15_tool104_1.part, mode=Mode.SUBTRACT)


with BuildPart() as f15_tool115:
    # F15_s116 → F15_t117 (new body)
    with BuildSketch(Plane.XZ.offset(7)):
        with BuildLine():
            ThreePointArc((23, 10), (24.1715728753, 12.8284271247), (27, 14))
            Line((27, 14), (27, 14.08))
            Line((27, 14.08), (22.92, 14.08))
            Line((22.92, 14.08), (22.92, 10))
            Line((22.92, 10), (23, 10))
        make_face()
    extrude(amount=F15_T117_DEPTH)

    split(bisect_by=Plane(origin=(20, -20, 0), x_dir=(0, 0, 1), z_dir=(-0.7071067812, 0.7071067812, 0)), keep=Keep.TOP)


with BuildPart() as f15_tool119:
    # F15_s120 → F15_t121 (new body)
    with BuildSketch(Plane(origin=(24.0710678119, 24.0710678119, 0), x_dir=(0, 0, 1), z_dir=(-0.7071067812, -0.7071067812, 0))):
        with BuildLine():
            ThreePointArc((14, -32.2842712475), (12.8284271247, -29.4558441227), (10, -28.2842712475))
            Line((10, -28.2842712475), (10, -28.2042712475))
            Line((10, -28.2042712475), (14.08, -28.2042712475))
            Line((14.08, -28.2042712475), (14.08, -32.2842712475))
            Line((14.08, -32.2842712475), (14, -32.2842712475))
        make_face()
    extrude(amount=F15_T121_DEPTH)

    split(bisect_by=Plane.YZ.offset(23), keep=Keep.BOTTOM)


with BuildPart() as f15_tool115_1:
    add(f15_tool115.part)

    # F15_t123: intersect F15_tool119
    add(f15_tool119.part, mode=Mode.INTERSECT)


with BuildPart() as f1_16:
    add(f1_15.part)

    # F15_t113: cut F15_tool115
    add(f15_tool115_1.part, mode=Mode.SUBTRACT)


with BuildPart() as f15_tool126:
    # F15_s127 → F15_t128 (new body)
    with BuildSketch(Plane.YZ.offset(43)):
        with BuildLine():
            ThreePointArc((-4, -5), (-1.1715728753, -3.8284271247), (0, -1))
            Line((0, -1), (0.08, -1))
            Line((0.08, -1), (0.08, -5.08))
            Line((0.08, -5.08), (-4, -5.08))
            Line((-4, -5.08), (-4, -5))
        make_face()
    extrude(amount=-F15_T128_DEPTH)

    split(bisect_by=Plane(origin=(14.25, 0, -14.25), x_dir=(0, 1, 0), z_dir=(-0.7071067812, 0, 0.7071067812)), keep=Keep.TOP)


with BuildPart() as f15_tool130:
    # F15_s131 → F15_t132 (new body)
    with BuildSketch(Plane(origin=(-0.3210678119, 0, -0.3210678119), x_dir=(0, 1, 0), z_dir=(0.7071067812, 0, 0.7071067812))):
        with BuildLine():
            ThreePointArc((-4, -20.1525432638), (-1.1715728753, -18.9809703886), (0, -16.1525432638))
            Line((0, -16.1525432638), (0.08, -16.1525432638))
            Line((0.08, -16.1525432638), (0.08, -20.2325432638))
            Line((0.08, -20.2325432638), (-4, -20.2325432638))
            Line((-4, -20.2325432638), (-4, -20.1525432638))
        make_face()
    extrude(amount=F15_T132_DEPTH)

    split(bisect_by=Plane.XY.offset(-5), keep=Keep.TOP)


with BuildPart() as f15_tool126_1:
    add(f15_tool126.part)

    # F15_t134: intersect F15_tool130
    add(f15_tool130.part, mode=Mode.INTERSECT)


with BuildPart() as f1_17:
    add(f1_16.part)

    # F15_t124: cut F15_tool126
    add(f15_tool126_1.part, mode=Mode.SUBTRACT)


with BuildPart() as f15_tool137:
    # F15_s138 → F15_t139 (new body)
    with BuildSketch(Plane(origin=(-0.3210678119, 0, -0.3210678119), x_dir=(0, 1, 0), z_dir=(0.7071067812, 0, 0.7071067812))):
        with BuildLine():
            ThreePointArc((-4, -20.1525432638), (-1.1715728753, -18.9809703886), (0, -16.1525432638))
            Line((0, -16.1525432638), (0.08, -16.1525432638))
            Line((0.08, -16.1525432638), (0.08, -20.2325432638))
            Line((0.08, -20.2325432638), (-4, -20.2325432638))
            Line((-4, -20.2325432638), (-4, -20.1525432638))
        make_face()
    extrude(amount=F15_T139_DEPTH)

    split(bisect_by=Plane.XY.offset(-7.5), keep=Keep.BOTTOM)


with BuildPart() as f15_tool141:
    # F15_s142 → F15_t143 (new body)
    with BuildSketch(Plane.YZ.offset(-10)):
        with BuildLine():
            ThreePointArc((-4, -7.5), (-1.1715728753, -6.3284271247), (0, -3.5))
            Line((0, -3.5), (0.08, -3.5))
            Line((0.08, -3.5), (0.08, -7.58))
            Line((0.08, -7.58), (-4, -7.58))
            Line((-4, -7.58), (-4, -7.5))
        make_face()
    extrude(amount=F15_T143_DEPTH)

    split(bisect_by=Plane(origin=(14.25, 0, -14.25), x_dir=(0, 1, 0), z_dir=(0.7071067812, 0, -0.7071067812)), keep=Keep.TOP)


with BuildPart() as f15_tool137_1:
    add(f15_tool137.part)

    # F15_t145: intersect F15_tool141
    add(f15_tool141.part, mode=Mode.INTERSECT)


with BuildPart() as f1_18:
    add(f1_17.part)

    # F15_t135: cut F15_tool137
    add(f15_tool137_1.part, mode=Mode.SUBTRACT)


with BuildPart() as f15_tool148:
    # F15_s149 → F15_t150 (new body)
    with BuildSketch(Plane.YZ.offset(-10)):
        with BuildLine():
            ThreePointArc((-4, -7.5), (-1.1715728753, -6.3284271247), (0, -3.5))
            Line((0, -3.5), (0.08, -3.5))
            Line((0.08, -3.5), (0.08, -7.58))
            Line((0.08, -7.58), (-4, -7.58))
            Line((-4, -7.58), (-4, -7.5))
        make_face()
    extrude(amount=F15_T150_DEPTH)

    split(bisect_by=Plane(origin=(-3.75, 0, -3.75), x_dir=(0, 1, 0), z_dir=(-0.7071067812, 0, -0.7071067812)), keep=Keep.TOP)


with BuildPart() as f15_tool152:
    # F15_s153 → F15_t154 (new body)
    with BuildSketch(Plane(origin=(-5.8210678119, 0, 5.8210678119), x_dir=(0, 1, 0), z_dir=(0.7071067812, 0, -0.7071067812))):
        with BuildLine():
            ThreePointArc((-4, -5.3033008589), (-1.1715728753, -4.1317279836), (0, -1.3033008589))
            Line((0, -1.3033008589), (0.08, -1.3033008589))
            Line((0.08, -1.3033008589), (0.08, -5.3833008589))
            Line((0.08, -5.3833008589), (-4, -5.3833008589))
            Line((-4, -5.3833008589), (-4, -5.3033008589))
        make_face()
    extrude(amount=F15_T154_DEPTH)

    split(bisect_by=Plane.XY.offset(-7.5), keep=Keep.BOTTOM)


with BuildPart() as f15_tool148_1:
    add(f15_tool148.part)

    # F15_t156: intersect F15_tool152
    add(f15_tool152.part, mode=Mode.INTERSECT)


with BuildPart() as f1_19:
    add(f1_18.part)

    # F15_t146: cut F15_tool148
    add(f15_tool148_1.part, mode=Mode.SUBTRACT)


with BuildPart() as f15_tool159:
    # F15_s160 → F15_t161 (new body)
    with BuildSketch(Plane(origin=(-5.8210678119, 0, 5.8210678119), x_dir=(0, 1, 0), z_dir=(0.7071067812, 0, -0.7071067812))):
        with BuildLine():
            ThreePointArc((-4, -5.3033008589), (-1.1715728753, -4.1317279836), (0, -1.3033008589))
            Line((0, -1.3033008589), (0.08, -1.3033008589))
            Line((0.08, -1.3033008589), (0.08, -5.3833008589))
            Line((0.08, -5.3833008589), (-4, -5.3833008589))
            Line((-4, -5.3833008589), (-4, -5.3033008589))
        make_face()
    extrude(amount=F15_T161_DEPTH)

    split(bisect_by=Plane.XY.offset(-5), keep=Keep.TOP)


with BuildPart() as f15_tool163:
    # F15_s164 → F15_t165 (new body)
    with BuildSketch(Plane.YZ.offset(7.5)):
        with BuildLine():
            ThreePointArc((-4, -5), (-1.1715728753, -3.8284271247), (0, -1))
            Line((0, -1), (0.08, -1))
            Line((0.08, -1), (0.08, -5.08))
            Line((0.08, -5.08), (-4, -5.08))
            Line((-4, -5.08), (-4, -5))
        make_face()
    extrude(amount=-F15_T165_DEPTH)

    split(bisect_by=Plane(origin=(-3.75, 0, -3.75), x_dir=(0, 1, 0), z_dir=(0.7071067812, 0, 0.7071067812)), keep=Keep.TOP)


with BuildPart() as f15_tool159_1:
    add(f15_tool159.part)

    # F15_t167: intersect F15_tool163
    add(f15_tool163.part, mode=Mode.INTERSECT)


with BuildPart() as f1_20:
    add(f1_19.part)

    # F15_t157: cut F15_tool159
    add(f15_tool159_1.part, mode=Mode.SUBTRACT)


with BuildPart() as f1_21:
    # F16: moved
    add(f1_20.part.rotate(Axis((10.5, -27, -7.5), (-1, 0, 0)), F16_ANGLE))


solid = f1_21.part
